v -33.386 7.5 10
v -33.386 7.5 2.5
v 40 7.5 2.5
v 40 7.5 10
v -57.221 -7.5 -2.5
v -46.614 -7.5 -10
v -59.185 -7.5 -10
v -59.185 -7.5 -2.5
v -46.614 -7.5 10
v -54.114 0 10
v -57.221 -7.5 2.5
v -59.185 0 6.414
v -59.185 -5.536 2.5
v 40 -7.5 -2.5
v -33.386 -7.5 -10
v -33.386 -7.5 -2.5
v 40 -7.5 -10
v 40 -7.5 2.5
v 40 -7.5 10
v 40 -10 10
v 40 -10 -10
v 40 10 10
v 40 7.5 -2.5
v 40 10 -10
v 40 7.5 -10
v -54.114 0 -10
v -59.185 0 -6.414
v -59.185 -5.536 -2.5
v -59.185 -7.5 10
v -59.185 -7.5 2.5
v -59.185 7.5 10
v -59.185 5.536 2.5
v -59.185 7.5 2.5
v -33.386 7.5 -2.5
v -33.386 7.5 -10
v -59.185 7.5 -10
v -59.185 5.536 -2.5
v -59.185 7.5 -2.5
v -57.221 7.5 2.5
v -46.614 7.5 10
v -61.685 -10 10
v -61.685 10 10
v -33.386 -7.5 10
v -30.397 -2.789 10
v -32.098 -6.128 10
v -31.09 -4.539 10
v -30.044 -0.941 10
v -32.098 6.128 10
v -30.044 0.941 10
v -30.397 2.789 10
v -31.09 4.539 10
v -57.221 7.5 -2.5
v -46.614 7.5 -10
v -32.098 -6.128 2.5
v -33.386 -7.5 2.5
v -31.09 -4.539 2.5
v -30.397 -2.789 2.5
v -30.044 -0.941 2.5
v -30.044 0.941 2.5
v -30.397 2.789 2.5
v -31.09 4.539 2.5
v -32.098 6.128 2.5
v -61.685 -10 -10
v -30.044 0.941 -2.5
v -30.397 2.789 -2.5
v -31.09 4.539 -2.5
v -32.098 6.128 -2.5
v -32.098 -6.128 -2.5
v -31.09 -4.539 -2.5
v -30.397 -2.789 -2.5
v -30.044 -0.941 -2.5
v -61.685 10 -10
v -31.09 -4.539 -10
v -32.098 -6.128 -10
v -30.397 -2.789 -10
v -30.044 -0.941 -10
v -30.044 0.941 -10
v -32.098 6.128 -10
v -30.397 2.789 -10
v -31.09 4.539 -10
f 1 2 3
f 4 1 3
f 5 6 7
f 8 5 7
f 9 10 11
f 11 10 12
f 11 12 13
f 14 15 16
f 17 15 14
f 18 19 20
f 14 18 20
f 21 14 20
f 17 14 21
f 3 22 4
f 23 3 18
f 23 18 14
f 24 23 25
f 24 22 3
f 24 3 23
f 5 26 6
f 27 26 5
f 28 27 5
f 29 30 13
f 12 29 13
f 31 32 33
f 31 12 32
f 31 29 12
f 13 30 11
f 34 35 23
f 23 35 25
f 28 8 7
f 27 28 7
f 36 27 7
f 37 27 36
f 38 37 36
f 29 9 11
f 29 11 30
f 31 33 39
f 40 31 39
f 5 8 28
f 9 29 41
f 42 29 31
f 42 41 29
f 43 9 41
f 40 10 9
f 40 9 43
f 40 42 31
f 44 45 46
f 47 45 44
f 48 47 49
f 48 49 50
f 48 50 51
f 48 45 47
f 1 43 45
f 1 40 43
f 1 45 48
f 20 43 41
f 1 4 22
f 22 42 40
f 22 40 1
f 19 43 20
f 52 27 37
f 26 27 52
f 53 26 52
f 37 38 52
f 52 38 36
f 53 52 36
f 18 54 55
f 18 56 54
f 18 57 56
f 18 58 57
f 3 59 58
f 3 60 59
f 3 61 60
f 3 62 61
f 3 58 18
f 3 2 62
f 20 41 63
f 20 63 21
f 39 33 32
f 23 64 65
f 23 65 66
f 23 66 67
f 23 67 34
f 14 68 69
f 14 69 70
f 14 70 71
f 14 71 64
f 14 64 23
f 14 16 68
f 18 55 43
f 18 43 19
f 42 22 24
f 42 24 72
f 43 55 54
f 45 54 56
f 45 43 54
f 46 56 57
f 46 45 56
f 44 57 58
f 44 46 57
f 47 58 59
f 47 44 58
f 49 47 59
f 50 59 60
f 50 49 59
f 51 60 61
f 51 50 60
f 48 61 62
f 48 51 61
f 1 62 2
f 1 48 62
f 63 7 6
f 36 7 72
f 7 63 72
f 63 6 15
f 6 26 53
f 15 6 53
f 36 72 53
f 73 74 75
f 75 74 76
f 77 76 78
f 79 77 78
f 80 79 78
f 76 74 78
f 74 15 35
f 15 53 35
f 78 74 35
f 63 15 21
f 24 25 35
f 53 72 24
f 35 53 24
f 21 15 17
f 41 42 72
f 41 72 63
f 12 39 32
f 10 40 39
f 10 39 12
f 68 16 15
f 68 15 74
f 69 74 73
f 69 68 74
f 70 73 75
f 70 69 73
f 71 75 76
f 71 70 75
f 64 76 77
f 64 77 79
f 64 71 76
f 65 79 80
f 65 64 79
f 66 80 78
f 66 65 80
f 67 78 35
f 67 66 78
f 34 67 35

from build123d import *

# Parameters (mm, degrees)
SKETCH1_W           = 80
SKETCH1_H           = 20
BOSS_EXTRUDE1_DEPTH = 10
SKETCH2_W           = 80
SKETCH2_H           = 7.5
CUT_EXTRUDE1_DEPTH  = 7.5
BOSS_EXTRUDE2_DEPTH = 10
SKETCH4_W           = 25.799353936
SKETCH4_H           = 15
BOSS_EXTRUDE3_DEPTH = 2.5
CHAMFER1_SIZE       = 7.5


# Some blends are built 0.0001 mm under size
with BuildPart() as part:
    # Sketch1 → Boss-Extrude1 (new, symmetric)
    with BuildSketch(Plane(origin=(0, 0, 0), x_dir=(1, 0, 0), z_dir=(0, 1, 0))):
        Rectangle(SKETCH1_W, SKETCH1_H)
    extrude(amount=BOSS_EXTRUDE1_DEPTH, both=True)

    # Sketch2 → Cut-Extrude1 (cut, symmetric)
    with BuildSketch(Plane(origin=(0, 0, 0), x_dir=(1, 0, 0), z_dir=(0, 1, 0))):
        with Locations((0, 6.25)):
            Rectangle(SKETCH2_W, SKETCH2_H)
        with Locations((0, -6.25)):
            Rectangle(SKETCH2_W, SKETCH2_H)
    extrude(amount=CUT_EXTRUDE1_DEPTH, both=True, mode=Mode.SUBTRACT)

    # Sketch3 → Boss-Extrude2 (add, symmetric)
    with BuildSketch(Plane.XY):
        with BuildLine():
            Line((-40, 10), (-61.684975658, 10))
            Line((-61.684975658, 10), (-61.684975658, -10))
            Line((-61.684975658, -10), (-40, -10))
            ThreePointArc((-40, -10), (-30, 0), (-40, 10))
        make_face()
        Polygon((-46.614378278, 7.5), (-54.114378278, 0), (-46.614378278, -7.5), (-59.184975658, -7.5), (-59.184975658, 7.5), align=None, mode=Mode.SUBTRACT)
    extrude(amount=BOSS_EXTRUDE2_DEPTH, both=True)

    # Sketch4 → Boss-Extrude3 (add, symmetric)
    with BuildSketch(Plane.XY):
        with Locations((-46.28529869, 0)):
            Rectangle(SKETCH4_W, SKETCH4_H)
    extrude(amount=BOSS_EXTRUDE3_DEPTH, both=True)

    # Chamfer1
    # the kernel refuses this chamfer: 7.5 mm, written as the material it adds along each edge
    with BuildSketch(Plane(origin=(-54.114378278, 0, 2.5), x_dir=(0.019442520806014087, 0.019442520806013695, 0.9996219169112968), z_dir=(0.7071067811865405, -0.7071067811865547, 0))) as chamfer1_piece_1_section:
        with BuildLine():
            Line((7.715048964, 0), (-0.424103662, 7.703383451))
            Line((-0.424103662, 7.703383451), (-0.574046949, 7.69925907))
            ThreePointArc((-0.574046949, 7.69925907), (-0.255969203, 3.850483722), (-0.149943288, -0.004124381))
            Line((-0.149943288, -0.004124381), (0.004124381, -0.149943288))
            ThreePointArc((0.004124381, -0.149943288), (3.858732485, -0.043917372), (7.719173345, -0.149943288))
            Line((7.719173345, -0.149943288), (7.715048964, 0))
        make_face()
    chamfer1_piece_1 = extrude(amount=29.894224128, mode=Mode.PRIVATE)
    chamfer1_piece_1 = split(chamfer1_piece_1, bisect_by=Plane(origin=(-52.527454049, -4.471025257, 10), z_dir=(0, 0, -1)), keep=Keep.TOP, mode=Mode.PRIVATE)
    chamfer1_piece_1 = split(chamfer1_piece_1, bisect_by=Plane(origin=(-52.527454049, -7.5, 5.197194263), z_dir=(0, 1, 0)), keep=Keep.TOP, mode=Mode.PRIVATE)
    add(chamfer1_piece_1)
    chamfer1_2_edges = [part.edges().sort_by_distance(p)[0] for p in [
        (-52.899676968, 1.21470131, 2.5),
    ]]
    chamfer(chamfer1_2_edges, length=CHAMFER1_SIZE - 0.0001)  # a hair under: the kernel refuses the full size
    # the kernel refuses this chamfer: 7.5 mm, written as the material it adds along each edge
    with BuildSketch(Plane(origin=(-54.114378278, 0, -2.5), x_dir=(0.019442520806014087, 0.019442520806013695, -0.9996219169112968), z_dir=(0.7071067811865405, -0.7071067811865547, 0))) as chamfer1_3_piece_1_section:
        with BuildLine():
            Line((7.715048964, 0), (-0.424103662, -7.703383451))
            Line((-0.424103662, -7.703383451), (-0.574046949, -7.69925907))
            ThreePointArc((-0.574046949, -7.69925907), (-0.255969203, -3.850483722), (-0.149943288, 0.004124381))
            Line((-0.149943288, 0.004124381), (0.004124381, 0.149943288))
            ThreePointArc((0.004124381, 0.149943288), (3.858732485, 0.043917372), (7.719173345, 0.149943288))
            Line((7.719173345, 0.149943288), (7.715048964, 0))
        make_face()
    chamfer1_3_piece_1 = extrude(amount=29.894224128, mode=Mode.PRIVATE)
    chamfer1_3_piece_1 = split(chamfer1_3_piece_1, bisect_by=Plane(origin=(-52.527454049, -4.471025257, -10), z_dir=(0, 0, 1)), keep=Keep.TOP, mode=Mode.PRIVATE)
    chamfer1_3_piece_1 = split(chamfer1_3_piece_1, bisect_by=Plane(origin=(-52.527454049, -7.5, -5.197194263), z_dir=(0, 1, 0)), keep=Keep.TOP, mode=Mode.PRIVATE)
    add(chamfer1_3_piece_1)
    chamfer1_4_edges = [part.edges().sort_by_distance(p)[0] for p in [
        (-52.899676968, 1.21470131, -2.5),
    ]]
    chamfer(chamfer1_4_edges, length=CHAMFER1_SIZE - 0.0001)  # a hair under: the kernel refuses the full size


solid = part.part
